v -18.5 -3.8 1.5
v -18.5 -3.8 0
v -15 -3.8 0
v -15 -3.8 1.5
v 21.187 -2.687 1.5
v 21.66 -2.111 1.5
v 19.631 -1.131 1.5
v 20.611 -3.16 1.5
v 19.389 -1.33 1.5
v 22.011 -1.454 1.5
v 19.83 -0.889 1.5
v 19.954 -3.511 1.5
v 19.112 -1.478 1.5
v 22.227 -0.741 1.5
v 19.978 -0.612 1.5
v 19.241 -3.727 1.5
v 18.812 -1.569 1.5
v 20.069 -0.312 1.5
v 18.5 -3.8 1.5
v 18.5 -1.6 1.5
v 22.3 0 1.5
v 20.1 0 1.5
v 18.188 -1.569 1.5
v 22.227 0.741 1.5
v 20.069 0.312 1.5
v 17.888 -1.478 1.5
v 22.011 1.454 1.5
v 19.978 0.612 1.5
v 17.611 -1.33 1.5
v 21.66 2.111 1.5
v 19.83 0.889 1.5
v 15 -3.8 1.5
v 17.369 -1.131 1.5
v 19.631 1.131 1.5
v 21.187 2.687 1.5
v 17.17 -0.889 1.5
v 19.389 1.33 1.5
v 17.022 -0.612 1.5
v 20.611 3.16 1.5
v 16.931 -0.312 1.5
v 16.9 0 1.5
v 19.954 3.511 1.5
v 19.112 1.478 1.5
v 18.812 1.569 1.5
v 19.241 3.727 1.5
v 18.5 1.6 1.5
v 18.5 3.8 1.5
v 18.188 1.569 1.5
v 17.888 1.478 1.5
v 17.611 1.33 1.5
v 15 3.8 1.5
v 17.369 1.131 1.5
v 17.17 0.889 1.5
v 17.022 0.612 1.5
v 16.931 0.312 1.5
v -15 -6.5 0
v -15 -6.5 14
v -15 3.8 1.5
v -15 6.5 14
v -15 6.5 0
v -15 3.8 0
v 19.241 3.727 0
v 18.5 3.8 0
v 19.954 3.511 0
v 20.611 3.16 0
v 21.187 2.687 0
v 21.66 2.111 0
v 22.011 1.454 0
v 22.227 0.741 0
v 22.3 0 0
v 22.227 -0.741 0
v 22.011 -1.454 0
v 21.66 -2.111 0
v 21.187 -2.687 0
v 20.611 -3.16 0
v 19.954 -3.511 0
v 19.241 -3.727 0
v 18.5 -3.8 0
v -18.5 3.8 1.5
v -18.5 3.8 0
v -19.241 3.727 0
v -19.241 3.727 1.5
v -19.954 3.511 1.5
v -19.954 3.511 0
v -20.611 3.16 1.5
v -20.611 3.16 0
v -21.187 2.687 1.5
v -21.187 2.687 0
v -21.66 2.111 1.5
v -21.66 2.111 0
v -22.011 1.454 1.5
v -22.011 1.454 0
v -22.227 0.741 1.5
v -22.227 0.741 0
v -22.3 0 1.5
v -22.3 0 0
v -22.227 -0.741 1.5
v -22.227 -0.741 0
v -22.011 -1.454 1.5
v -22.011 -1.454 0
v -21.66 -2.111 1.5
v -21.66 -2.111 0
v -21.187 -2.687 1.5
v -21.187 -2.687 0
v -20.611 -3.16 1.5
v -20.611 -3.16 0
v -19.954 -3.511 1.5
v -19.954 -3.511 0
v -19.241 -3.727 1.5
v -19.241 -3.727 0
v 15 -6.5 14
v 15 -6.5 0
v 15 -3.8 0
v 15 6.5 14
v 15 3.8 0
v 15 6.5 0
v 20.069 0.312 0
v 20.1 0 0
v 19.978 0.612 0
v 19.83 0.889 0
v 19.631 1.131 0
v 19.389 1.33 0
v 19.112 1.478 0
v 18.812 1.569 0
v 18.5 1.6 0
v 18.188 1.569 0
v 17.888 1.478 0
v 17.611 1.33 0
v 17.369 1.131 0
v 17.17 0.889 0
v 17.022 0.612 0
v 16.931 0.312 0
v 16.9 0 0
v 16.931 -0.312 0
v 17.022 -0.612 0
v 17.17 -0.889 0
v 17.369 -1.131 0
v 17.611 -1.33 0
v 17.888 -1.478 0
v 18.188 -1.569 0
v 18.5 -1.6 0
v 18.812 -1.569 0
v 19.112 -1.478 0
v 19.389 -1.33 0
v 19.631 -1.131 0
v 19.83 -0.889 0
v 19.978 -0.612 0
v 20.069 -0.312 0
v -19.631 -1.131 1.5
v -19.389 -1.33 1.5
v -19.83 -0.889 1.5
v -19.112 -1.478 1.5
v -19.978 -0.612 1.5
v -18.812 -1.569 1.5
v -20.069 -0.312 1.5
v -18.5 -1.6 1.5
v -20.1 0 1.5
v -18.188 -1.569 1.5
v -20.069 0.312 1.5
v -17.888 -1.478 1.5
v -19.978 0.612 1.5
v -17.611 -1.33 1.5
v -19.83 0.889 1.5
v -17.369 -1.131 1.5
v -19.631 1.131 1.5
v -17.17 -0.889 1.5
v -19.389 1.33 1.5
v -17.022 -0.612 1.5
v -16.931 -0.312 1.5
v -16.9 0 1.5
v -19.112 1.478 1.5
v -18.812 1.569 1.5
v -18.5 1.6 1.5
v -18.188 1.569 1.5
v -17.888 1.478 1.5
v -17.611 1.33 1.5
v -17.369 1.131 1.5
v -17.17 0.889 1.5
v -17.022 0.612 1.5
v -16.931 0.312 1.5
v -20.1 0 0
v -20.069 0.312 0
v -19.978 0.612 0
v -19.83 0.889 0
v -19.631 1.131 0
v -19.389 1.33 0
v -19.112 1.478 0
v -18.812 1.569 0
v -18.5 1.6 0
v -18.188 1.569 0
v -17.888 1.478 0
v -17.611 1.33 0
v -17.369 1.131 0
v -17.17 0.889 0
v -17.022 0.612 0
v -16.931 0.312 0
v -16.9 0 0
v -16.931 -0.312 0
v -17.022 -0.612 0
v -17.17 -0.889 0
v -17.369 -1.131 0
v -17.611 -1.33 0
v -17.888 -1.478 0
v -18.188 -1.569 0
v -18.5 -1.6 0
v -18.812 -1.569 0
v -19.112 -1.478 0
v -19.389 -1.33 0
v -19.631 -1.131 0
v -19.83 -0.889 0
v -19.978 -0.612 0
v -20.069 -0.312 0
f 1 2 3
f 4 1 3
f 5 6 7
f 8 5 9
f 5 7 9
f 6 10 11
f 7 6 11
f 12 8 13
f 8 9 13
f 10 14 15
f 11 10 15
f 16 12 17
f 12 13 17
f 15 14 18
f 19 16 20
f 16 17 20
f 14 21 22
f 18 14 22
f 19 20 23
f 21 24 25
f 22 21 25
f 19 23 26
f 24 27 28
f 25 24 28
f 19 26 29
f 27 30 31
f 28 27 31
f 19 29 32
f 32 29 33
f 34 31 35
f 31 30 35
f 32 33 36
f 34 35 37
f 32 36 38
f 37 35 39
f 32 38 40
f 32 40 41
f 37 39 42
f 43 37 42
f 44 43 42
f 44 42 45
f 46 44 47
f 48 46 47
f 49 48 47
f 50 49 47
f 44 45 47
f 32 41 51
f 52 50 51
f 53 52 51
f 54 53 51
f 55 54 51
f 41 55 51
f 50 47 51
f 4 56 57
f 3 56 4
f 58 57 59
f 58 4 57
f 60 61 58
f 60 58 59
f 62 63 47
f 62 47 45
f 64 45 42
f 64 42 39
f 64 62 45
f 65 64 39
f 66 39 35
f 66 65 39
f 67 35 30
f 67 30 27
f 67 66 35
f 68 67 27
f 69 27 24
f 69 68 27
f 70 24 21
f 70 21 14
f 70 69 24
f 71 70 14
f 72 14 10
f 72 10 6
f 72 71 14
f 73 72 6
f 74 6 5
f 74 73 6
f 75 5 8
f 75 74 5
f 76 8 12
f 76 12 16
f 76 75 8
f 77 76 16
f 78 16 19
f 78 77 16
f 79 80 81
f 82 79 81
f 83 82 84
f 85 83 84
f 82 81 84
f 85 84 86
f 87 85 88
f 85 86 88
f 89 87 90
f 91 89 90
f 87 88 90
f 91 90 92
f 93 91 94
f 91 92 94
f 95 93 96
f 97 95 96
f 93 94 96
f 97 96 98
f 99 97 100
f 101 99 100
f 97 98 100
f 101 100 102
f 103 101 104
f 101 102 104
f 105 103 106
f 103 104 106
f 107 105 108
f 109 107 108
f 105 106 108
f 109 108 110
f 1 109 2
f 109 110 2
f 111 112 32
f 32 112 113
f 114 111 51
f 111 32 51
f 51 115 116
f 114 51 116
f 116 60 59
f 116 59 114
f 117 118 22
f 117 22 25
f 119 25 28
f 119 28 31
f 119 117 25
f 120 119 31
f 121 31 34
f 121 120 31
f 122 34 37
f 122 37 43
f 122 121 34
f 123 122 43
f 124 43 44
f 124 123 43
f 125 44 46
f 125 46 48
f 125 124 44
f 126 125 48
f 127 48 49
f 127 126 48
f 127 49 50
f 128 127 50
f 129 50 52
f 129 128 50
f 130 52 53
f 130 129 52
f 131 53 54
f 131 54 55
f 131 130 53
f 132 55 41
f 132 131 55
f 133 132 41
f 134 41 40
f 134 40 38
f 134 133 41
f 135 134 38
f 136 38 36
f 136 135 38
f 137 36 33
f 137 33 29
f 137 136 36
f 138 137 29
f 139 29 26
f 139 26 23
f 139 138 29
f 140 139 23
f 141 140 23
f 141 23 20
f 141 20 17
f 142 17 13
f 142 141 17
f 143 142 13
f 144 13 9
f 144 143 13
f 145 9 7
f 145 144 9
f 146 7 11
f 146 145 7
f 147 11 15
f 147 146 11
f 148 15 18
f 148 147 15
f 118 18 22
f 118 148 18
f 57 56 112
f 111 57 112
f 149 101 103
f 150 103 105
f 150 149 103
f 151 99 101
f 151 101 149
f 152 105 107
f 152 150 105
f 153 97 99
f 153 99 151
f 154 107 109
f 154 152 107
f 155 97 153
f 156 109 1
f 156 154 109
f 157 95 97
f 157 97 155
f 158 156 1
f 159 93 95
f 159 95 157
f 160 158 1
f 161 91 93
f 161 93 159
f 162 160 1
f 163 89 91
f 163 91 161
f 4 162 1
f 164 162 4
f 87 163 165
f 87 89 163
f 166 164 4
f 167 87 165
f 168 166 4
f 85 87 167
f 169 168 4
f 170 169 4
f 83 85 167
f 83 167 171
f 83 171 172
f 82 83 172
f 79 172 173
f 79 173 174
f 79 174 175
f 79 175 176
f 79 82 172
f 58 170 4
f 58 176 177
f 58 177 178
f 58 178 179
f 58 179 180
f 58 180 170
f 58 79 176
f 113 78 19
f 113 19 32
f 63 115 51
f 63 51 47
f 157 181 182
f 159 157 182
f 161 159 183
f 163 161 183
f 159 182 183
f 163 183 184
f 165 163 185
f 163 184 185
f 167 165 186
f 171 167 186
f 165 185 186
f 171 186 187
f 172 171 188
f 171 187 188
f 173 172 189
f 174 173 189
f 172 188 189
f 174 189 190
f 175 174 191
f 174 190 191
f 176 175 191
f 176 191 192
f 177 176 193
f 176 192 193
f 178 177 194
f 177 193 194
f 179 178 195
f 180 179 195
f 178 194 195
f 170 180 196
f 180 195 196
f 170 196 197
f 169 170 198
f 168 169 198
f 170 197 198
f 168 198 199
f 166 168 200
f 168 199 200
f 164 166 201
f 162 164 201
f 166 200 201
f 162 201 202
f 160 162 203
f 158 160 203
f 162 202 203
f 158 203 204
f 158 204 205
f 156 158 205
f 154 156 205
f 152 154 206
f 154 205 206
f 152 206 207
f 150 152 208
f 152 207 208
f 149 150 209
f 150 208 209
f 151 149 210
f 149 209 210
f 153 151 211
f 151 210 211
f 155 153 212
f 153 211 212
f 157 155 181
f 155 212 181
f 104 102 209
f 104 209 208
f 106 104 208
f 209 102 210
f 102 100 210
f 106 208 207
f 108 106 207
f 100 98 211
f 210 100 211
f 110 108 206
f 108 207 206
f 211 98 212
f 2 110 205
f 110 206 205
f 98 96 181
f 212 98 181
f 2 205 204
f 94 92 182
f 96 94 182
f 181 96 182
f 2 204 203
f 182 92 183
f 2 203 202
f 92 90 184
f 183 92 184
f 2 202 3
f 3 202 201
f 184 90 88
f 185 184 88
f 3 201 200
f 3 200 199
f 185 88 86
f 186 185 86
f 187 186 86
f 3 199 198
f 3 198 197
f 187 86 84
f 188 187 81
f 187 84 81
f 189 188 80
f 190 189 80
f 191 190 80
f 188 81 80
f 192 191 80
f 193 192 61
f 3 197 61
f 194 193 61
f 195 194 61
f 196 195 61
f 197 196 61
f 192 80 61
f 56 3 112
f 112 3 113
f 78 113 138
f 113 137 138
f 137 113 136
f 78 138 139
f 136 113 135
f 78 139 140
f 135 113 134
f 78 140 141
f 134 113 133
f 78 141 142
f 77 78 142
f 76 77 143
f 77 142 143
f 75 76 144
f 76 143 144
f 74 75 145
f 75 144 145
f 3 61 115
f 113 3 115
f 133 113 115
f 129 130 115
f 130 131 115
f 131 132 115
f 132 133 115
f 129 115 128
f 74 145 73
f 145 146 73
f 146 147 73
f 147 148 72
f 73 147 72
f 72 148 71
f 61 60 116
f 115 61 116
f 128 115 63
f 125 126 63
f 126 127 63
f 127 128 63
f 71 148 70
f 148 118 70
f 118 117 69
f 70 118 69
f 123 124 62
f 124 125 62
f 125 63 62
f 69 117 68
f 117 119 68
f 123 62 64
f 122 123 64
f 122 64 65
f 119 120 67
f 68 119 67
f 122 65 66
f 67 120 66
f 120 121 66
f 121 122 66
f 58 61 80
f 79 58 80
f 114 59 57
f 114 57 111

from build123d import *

# Parameters (mm, degrees)
SKETCH1_W           = 30
SKETCH1_H           = 13
BOSS_EXTRUDE1_DEPTH = 14
SKETCH2_R           = 1.6
BOSS_EXTRUDE2_DEPTH = 1.5


with BuildPart() as part:
    # Sketch1 → Boss-Extrude1 (new body)
    with BuildSketch(Plane.XY):
        Rectangle(SKETCH1_W, SKETCH1_H)
    extrude(amount=BOSS_EXTRUDE1_DEPTH)

    # Sketch2 → Boss-Extrude2 (add)
    with BuildSketch(Plane.XY):
        with BuildLine():
            Line((15, -3.8), (15, 3.8))
            Line((15, 3.8), (18.5, 3.8))
            ThreePointArc((18.5, 3.8), (22.3, 0), (18.5, -3.8))
            Line((18.5, -3.8), (15, -3.8))
        make_face()
        with Locations((18.5, 0)):
            Circle(SKETCH2_R, mode=Mode.SUBTRACT)
    boss_extrude2 = extrude(amount=BOSS_EXTRUDE2_DEPTH)

    # Mirror1: Boss-Extrude2 across plane
    add(boss_extrude2.mirror(Plane(origin=(0, 0, 0), x_dir=(0, 0, 1), z_dir=(1, 0, 0))))


solid = part.part
